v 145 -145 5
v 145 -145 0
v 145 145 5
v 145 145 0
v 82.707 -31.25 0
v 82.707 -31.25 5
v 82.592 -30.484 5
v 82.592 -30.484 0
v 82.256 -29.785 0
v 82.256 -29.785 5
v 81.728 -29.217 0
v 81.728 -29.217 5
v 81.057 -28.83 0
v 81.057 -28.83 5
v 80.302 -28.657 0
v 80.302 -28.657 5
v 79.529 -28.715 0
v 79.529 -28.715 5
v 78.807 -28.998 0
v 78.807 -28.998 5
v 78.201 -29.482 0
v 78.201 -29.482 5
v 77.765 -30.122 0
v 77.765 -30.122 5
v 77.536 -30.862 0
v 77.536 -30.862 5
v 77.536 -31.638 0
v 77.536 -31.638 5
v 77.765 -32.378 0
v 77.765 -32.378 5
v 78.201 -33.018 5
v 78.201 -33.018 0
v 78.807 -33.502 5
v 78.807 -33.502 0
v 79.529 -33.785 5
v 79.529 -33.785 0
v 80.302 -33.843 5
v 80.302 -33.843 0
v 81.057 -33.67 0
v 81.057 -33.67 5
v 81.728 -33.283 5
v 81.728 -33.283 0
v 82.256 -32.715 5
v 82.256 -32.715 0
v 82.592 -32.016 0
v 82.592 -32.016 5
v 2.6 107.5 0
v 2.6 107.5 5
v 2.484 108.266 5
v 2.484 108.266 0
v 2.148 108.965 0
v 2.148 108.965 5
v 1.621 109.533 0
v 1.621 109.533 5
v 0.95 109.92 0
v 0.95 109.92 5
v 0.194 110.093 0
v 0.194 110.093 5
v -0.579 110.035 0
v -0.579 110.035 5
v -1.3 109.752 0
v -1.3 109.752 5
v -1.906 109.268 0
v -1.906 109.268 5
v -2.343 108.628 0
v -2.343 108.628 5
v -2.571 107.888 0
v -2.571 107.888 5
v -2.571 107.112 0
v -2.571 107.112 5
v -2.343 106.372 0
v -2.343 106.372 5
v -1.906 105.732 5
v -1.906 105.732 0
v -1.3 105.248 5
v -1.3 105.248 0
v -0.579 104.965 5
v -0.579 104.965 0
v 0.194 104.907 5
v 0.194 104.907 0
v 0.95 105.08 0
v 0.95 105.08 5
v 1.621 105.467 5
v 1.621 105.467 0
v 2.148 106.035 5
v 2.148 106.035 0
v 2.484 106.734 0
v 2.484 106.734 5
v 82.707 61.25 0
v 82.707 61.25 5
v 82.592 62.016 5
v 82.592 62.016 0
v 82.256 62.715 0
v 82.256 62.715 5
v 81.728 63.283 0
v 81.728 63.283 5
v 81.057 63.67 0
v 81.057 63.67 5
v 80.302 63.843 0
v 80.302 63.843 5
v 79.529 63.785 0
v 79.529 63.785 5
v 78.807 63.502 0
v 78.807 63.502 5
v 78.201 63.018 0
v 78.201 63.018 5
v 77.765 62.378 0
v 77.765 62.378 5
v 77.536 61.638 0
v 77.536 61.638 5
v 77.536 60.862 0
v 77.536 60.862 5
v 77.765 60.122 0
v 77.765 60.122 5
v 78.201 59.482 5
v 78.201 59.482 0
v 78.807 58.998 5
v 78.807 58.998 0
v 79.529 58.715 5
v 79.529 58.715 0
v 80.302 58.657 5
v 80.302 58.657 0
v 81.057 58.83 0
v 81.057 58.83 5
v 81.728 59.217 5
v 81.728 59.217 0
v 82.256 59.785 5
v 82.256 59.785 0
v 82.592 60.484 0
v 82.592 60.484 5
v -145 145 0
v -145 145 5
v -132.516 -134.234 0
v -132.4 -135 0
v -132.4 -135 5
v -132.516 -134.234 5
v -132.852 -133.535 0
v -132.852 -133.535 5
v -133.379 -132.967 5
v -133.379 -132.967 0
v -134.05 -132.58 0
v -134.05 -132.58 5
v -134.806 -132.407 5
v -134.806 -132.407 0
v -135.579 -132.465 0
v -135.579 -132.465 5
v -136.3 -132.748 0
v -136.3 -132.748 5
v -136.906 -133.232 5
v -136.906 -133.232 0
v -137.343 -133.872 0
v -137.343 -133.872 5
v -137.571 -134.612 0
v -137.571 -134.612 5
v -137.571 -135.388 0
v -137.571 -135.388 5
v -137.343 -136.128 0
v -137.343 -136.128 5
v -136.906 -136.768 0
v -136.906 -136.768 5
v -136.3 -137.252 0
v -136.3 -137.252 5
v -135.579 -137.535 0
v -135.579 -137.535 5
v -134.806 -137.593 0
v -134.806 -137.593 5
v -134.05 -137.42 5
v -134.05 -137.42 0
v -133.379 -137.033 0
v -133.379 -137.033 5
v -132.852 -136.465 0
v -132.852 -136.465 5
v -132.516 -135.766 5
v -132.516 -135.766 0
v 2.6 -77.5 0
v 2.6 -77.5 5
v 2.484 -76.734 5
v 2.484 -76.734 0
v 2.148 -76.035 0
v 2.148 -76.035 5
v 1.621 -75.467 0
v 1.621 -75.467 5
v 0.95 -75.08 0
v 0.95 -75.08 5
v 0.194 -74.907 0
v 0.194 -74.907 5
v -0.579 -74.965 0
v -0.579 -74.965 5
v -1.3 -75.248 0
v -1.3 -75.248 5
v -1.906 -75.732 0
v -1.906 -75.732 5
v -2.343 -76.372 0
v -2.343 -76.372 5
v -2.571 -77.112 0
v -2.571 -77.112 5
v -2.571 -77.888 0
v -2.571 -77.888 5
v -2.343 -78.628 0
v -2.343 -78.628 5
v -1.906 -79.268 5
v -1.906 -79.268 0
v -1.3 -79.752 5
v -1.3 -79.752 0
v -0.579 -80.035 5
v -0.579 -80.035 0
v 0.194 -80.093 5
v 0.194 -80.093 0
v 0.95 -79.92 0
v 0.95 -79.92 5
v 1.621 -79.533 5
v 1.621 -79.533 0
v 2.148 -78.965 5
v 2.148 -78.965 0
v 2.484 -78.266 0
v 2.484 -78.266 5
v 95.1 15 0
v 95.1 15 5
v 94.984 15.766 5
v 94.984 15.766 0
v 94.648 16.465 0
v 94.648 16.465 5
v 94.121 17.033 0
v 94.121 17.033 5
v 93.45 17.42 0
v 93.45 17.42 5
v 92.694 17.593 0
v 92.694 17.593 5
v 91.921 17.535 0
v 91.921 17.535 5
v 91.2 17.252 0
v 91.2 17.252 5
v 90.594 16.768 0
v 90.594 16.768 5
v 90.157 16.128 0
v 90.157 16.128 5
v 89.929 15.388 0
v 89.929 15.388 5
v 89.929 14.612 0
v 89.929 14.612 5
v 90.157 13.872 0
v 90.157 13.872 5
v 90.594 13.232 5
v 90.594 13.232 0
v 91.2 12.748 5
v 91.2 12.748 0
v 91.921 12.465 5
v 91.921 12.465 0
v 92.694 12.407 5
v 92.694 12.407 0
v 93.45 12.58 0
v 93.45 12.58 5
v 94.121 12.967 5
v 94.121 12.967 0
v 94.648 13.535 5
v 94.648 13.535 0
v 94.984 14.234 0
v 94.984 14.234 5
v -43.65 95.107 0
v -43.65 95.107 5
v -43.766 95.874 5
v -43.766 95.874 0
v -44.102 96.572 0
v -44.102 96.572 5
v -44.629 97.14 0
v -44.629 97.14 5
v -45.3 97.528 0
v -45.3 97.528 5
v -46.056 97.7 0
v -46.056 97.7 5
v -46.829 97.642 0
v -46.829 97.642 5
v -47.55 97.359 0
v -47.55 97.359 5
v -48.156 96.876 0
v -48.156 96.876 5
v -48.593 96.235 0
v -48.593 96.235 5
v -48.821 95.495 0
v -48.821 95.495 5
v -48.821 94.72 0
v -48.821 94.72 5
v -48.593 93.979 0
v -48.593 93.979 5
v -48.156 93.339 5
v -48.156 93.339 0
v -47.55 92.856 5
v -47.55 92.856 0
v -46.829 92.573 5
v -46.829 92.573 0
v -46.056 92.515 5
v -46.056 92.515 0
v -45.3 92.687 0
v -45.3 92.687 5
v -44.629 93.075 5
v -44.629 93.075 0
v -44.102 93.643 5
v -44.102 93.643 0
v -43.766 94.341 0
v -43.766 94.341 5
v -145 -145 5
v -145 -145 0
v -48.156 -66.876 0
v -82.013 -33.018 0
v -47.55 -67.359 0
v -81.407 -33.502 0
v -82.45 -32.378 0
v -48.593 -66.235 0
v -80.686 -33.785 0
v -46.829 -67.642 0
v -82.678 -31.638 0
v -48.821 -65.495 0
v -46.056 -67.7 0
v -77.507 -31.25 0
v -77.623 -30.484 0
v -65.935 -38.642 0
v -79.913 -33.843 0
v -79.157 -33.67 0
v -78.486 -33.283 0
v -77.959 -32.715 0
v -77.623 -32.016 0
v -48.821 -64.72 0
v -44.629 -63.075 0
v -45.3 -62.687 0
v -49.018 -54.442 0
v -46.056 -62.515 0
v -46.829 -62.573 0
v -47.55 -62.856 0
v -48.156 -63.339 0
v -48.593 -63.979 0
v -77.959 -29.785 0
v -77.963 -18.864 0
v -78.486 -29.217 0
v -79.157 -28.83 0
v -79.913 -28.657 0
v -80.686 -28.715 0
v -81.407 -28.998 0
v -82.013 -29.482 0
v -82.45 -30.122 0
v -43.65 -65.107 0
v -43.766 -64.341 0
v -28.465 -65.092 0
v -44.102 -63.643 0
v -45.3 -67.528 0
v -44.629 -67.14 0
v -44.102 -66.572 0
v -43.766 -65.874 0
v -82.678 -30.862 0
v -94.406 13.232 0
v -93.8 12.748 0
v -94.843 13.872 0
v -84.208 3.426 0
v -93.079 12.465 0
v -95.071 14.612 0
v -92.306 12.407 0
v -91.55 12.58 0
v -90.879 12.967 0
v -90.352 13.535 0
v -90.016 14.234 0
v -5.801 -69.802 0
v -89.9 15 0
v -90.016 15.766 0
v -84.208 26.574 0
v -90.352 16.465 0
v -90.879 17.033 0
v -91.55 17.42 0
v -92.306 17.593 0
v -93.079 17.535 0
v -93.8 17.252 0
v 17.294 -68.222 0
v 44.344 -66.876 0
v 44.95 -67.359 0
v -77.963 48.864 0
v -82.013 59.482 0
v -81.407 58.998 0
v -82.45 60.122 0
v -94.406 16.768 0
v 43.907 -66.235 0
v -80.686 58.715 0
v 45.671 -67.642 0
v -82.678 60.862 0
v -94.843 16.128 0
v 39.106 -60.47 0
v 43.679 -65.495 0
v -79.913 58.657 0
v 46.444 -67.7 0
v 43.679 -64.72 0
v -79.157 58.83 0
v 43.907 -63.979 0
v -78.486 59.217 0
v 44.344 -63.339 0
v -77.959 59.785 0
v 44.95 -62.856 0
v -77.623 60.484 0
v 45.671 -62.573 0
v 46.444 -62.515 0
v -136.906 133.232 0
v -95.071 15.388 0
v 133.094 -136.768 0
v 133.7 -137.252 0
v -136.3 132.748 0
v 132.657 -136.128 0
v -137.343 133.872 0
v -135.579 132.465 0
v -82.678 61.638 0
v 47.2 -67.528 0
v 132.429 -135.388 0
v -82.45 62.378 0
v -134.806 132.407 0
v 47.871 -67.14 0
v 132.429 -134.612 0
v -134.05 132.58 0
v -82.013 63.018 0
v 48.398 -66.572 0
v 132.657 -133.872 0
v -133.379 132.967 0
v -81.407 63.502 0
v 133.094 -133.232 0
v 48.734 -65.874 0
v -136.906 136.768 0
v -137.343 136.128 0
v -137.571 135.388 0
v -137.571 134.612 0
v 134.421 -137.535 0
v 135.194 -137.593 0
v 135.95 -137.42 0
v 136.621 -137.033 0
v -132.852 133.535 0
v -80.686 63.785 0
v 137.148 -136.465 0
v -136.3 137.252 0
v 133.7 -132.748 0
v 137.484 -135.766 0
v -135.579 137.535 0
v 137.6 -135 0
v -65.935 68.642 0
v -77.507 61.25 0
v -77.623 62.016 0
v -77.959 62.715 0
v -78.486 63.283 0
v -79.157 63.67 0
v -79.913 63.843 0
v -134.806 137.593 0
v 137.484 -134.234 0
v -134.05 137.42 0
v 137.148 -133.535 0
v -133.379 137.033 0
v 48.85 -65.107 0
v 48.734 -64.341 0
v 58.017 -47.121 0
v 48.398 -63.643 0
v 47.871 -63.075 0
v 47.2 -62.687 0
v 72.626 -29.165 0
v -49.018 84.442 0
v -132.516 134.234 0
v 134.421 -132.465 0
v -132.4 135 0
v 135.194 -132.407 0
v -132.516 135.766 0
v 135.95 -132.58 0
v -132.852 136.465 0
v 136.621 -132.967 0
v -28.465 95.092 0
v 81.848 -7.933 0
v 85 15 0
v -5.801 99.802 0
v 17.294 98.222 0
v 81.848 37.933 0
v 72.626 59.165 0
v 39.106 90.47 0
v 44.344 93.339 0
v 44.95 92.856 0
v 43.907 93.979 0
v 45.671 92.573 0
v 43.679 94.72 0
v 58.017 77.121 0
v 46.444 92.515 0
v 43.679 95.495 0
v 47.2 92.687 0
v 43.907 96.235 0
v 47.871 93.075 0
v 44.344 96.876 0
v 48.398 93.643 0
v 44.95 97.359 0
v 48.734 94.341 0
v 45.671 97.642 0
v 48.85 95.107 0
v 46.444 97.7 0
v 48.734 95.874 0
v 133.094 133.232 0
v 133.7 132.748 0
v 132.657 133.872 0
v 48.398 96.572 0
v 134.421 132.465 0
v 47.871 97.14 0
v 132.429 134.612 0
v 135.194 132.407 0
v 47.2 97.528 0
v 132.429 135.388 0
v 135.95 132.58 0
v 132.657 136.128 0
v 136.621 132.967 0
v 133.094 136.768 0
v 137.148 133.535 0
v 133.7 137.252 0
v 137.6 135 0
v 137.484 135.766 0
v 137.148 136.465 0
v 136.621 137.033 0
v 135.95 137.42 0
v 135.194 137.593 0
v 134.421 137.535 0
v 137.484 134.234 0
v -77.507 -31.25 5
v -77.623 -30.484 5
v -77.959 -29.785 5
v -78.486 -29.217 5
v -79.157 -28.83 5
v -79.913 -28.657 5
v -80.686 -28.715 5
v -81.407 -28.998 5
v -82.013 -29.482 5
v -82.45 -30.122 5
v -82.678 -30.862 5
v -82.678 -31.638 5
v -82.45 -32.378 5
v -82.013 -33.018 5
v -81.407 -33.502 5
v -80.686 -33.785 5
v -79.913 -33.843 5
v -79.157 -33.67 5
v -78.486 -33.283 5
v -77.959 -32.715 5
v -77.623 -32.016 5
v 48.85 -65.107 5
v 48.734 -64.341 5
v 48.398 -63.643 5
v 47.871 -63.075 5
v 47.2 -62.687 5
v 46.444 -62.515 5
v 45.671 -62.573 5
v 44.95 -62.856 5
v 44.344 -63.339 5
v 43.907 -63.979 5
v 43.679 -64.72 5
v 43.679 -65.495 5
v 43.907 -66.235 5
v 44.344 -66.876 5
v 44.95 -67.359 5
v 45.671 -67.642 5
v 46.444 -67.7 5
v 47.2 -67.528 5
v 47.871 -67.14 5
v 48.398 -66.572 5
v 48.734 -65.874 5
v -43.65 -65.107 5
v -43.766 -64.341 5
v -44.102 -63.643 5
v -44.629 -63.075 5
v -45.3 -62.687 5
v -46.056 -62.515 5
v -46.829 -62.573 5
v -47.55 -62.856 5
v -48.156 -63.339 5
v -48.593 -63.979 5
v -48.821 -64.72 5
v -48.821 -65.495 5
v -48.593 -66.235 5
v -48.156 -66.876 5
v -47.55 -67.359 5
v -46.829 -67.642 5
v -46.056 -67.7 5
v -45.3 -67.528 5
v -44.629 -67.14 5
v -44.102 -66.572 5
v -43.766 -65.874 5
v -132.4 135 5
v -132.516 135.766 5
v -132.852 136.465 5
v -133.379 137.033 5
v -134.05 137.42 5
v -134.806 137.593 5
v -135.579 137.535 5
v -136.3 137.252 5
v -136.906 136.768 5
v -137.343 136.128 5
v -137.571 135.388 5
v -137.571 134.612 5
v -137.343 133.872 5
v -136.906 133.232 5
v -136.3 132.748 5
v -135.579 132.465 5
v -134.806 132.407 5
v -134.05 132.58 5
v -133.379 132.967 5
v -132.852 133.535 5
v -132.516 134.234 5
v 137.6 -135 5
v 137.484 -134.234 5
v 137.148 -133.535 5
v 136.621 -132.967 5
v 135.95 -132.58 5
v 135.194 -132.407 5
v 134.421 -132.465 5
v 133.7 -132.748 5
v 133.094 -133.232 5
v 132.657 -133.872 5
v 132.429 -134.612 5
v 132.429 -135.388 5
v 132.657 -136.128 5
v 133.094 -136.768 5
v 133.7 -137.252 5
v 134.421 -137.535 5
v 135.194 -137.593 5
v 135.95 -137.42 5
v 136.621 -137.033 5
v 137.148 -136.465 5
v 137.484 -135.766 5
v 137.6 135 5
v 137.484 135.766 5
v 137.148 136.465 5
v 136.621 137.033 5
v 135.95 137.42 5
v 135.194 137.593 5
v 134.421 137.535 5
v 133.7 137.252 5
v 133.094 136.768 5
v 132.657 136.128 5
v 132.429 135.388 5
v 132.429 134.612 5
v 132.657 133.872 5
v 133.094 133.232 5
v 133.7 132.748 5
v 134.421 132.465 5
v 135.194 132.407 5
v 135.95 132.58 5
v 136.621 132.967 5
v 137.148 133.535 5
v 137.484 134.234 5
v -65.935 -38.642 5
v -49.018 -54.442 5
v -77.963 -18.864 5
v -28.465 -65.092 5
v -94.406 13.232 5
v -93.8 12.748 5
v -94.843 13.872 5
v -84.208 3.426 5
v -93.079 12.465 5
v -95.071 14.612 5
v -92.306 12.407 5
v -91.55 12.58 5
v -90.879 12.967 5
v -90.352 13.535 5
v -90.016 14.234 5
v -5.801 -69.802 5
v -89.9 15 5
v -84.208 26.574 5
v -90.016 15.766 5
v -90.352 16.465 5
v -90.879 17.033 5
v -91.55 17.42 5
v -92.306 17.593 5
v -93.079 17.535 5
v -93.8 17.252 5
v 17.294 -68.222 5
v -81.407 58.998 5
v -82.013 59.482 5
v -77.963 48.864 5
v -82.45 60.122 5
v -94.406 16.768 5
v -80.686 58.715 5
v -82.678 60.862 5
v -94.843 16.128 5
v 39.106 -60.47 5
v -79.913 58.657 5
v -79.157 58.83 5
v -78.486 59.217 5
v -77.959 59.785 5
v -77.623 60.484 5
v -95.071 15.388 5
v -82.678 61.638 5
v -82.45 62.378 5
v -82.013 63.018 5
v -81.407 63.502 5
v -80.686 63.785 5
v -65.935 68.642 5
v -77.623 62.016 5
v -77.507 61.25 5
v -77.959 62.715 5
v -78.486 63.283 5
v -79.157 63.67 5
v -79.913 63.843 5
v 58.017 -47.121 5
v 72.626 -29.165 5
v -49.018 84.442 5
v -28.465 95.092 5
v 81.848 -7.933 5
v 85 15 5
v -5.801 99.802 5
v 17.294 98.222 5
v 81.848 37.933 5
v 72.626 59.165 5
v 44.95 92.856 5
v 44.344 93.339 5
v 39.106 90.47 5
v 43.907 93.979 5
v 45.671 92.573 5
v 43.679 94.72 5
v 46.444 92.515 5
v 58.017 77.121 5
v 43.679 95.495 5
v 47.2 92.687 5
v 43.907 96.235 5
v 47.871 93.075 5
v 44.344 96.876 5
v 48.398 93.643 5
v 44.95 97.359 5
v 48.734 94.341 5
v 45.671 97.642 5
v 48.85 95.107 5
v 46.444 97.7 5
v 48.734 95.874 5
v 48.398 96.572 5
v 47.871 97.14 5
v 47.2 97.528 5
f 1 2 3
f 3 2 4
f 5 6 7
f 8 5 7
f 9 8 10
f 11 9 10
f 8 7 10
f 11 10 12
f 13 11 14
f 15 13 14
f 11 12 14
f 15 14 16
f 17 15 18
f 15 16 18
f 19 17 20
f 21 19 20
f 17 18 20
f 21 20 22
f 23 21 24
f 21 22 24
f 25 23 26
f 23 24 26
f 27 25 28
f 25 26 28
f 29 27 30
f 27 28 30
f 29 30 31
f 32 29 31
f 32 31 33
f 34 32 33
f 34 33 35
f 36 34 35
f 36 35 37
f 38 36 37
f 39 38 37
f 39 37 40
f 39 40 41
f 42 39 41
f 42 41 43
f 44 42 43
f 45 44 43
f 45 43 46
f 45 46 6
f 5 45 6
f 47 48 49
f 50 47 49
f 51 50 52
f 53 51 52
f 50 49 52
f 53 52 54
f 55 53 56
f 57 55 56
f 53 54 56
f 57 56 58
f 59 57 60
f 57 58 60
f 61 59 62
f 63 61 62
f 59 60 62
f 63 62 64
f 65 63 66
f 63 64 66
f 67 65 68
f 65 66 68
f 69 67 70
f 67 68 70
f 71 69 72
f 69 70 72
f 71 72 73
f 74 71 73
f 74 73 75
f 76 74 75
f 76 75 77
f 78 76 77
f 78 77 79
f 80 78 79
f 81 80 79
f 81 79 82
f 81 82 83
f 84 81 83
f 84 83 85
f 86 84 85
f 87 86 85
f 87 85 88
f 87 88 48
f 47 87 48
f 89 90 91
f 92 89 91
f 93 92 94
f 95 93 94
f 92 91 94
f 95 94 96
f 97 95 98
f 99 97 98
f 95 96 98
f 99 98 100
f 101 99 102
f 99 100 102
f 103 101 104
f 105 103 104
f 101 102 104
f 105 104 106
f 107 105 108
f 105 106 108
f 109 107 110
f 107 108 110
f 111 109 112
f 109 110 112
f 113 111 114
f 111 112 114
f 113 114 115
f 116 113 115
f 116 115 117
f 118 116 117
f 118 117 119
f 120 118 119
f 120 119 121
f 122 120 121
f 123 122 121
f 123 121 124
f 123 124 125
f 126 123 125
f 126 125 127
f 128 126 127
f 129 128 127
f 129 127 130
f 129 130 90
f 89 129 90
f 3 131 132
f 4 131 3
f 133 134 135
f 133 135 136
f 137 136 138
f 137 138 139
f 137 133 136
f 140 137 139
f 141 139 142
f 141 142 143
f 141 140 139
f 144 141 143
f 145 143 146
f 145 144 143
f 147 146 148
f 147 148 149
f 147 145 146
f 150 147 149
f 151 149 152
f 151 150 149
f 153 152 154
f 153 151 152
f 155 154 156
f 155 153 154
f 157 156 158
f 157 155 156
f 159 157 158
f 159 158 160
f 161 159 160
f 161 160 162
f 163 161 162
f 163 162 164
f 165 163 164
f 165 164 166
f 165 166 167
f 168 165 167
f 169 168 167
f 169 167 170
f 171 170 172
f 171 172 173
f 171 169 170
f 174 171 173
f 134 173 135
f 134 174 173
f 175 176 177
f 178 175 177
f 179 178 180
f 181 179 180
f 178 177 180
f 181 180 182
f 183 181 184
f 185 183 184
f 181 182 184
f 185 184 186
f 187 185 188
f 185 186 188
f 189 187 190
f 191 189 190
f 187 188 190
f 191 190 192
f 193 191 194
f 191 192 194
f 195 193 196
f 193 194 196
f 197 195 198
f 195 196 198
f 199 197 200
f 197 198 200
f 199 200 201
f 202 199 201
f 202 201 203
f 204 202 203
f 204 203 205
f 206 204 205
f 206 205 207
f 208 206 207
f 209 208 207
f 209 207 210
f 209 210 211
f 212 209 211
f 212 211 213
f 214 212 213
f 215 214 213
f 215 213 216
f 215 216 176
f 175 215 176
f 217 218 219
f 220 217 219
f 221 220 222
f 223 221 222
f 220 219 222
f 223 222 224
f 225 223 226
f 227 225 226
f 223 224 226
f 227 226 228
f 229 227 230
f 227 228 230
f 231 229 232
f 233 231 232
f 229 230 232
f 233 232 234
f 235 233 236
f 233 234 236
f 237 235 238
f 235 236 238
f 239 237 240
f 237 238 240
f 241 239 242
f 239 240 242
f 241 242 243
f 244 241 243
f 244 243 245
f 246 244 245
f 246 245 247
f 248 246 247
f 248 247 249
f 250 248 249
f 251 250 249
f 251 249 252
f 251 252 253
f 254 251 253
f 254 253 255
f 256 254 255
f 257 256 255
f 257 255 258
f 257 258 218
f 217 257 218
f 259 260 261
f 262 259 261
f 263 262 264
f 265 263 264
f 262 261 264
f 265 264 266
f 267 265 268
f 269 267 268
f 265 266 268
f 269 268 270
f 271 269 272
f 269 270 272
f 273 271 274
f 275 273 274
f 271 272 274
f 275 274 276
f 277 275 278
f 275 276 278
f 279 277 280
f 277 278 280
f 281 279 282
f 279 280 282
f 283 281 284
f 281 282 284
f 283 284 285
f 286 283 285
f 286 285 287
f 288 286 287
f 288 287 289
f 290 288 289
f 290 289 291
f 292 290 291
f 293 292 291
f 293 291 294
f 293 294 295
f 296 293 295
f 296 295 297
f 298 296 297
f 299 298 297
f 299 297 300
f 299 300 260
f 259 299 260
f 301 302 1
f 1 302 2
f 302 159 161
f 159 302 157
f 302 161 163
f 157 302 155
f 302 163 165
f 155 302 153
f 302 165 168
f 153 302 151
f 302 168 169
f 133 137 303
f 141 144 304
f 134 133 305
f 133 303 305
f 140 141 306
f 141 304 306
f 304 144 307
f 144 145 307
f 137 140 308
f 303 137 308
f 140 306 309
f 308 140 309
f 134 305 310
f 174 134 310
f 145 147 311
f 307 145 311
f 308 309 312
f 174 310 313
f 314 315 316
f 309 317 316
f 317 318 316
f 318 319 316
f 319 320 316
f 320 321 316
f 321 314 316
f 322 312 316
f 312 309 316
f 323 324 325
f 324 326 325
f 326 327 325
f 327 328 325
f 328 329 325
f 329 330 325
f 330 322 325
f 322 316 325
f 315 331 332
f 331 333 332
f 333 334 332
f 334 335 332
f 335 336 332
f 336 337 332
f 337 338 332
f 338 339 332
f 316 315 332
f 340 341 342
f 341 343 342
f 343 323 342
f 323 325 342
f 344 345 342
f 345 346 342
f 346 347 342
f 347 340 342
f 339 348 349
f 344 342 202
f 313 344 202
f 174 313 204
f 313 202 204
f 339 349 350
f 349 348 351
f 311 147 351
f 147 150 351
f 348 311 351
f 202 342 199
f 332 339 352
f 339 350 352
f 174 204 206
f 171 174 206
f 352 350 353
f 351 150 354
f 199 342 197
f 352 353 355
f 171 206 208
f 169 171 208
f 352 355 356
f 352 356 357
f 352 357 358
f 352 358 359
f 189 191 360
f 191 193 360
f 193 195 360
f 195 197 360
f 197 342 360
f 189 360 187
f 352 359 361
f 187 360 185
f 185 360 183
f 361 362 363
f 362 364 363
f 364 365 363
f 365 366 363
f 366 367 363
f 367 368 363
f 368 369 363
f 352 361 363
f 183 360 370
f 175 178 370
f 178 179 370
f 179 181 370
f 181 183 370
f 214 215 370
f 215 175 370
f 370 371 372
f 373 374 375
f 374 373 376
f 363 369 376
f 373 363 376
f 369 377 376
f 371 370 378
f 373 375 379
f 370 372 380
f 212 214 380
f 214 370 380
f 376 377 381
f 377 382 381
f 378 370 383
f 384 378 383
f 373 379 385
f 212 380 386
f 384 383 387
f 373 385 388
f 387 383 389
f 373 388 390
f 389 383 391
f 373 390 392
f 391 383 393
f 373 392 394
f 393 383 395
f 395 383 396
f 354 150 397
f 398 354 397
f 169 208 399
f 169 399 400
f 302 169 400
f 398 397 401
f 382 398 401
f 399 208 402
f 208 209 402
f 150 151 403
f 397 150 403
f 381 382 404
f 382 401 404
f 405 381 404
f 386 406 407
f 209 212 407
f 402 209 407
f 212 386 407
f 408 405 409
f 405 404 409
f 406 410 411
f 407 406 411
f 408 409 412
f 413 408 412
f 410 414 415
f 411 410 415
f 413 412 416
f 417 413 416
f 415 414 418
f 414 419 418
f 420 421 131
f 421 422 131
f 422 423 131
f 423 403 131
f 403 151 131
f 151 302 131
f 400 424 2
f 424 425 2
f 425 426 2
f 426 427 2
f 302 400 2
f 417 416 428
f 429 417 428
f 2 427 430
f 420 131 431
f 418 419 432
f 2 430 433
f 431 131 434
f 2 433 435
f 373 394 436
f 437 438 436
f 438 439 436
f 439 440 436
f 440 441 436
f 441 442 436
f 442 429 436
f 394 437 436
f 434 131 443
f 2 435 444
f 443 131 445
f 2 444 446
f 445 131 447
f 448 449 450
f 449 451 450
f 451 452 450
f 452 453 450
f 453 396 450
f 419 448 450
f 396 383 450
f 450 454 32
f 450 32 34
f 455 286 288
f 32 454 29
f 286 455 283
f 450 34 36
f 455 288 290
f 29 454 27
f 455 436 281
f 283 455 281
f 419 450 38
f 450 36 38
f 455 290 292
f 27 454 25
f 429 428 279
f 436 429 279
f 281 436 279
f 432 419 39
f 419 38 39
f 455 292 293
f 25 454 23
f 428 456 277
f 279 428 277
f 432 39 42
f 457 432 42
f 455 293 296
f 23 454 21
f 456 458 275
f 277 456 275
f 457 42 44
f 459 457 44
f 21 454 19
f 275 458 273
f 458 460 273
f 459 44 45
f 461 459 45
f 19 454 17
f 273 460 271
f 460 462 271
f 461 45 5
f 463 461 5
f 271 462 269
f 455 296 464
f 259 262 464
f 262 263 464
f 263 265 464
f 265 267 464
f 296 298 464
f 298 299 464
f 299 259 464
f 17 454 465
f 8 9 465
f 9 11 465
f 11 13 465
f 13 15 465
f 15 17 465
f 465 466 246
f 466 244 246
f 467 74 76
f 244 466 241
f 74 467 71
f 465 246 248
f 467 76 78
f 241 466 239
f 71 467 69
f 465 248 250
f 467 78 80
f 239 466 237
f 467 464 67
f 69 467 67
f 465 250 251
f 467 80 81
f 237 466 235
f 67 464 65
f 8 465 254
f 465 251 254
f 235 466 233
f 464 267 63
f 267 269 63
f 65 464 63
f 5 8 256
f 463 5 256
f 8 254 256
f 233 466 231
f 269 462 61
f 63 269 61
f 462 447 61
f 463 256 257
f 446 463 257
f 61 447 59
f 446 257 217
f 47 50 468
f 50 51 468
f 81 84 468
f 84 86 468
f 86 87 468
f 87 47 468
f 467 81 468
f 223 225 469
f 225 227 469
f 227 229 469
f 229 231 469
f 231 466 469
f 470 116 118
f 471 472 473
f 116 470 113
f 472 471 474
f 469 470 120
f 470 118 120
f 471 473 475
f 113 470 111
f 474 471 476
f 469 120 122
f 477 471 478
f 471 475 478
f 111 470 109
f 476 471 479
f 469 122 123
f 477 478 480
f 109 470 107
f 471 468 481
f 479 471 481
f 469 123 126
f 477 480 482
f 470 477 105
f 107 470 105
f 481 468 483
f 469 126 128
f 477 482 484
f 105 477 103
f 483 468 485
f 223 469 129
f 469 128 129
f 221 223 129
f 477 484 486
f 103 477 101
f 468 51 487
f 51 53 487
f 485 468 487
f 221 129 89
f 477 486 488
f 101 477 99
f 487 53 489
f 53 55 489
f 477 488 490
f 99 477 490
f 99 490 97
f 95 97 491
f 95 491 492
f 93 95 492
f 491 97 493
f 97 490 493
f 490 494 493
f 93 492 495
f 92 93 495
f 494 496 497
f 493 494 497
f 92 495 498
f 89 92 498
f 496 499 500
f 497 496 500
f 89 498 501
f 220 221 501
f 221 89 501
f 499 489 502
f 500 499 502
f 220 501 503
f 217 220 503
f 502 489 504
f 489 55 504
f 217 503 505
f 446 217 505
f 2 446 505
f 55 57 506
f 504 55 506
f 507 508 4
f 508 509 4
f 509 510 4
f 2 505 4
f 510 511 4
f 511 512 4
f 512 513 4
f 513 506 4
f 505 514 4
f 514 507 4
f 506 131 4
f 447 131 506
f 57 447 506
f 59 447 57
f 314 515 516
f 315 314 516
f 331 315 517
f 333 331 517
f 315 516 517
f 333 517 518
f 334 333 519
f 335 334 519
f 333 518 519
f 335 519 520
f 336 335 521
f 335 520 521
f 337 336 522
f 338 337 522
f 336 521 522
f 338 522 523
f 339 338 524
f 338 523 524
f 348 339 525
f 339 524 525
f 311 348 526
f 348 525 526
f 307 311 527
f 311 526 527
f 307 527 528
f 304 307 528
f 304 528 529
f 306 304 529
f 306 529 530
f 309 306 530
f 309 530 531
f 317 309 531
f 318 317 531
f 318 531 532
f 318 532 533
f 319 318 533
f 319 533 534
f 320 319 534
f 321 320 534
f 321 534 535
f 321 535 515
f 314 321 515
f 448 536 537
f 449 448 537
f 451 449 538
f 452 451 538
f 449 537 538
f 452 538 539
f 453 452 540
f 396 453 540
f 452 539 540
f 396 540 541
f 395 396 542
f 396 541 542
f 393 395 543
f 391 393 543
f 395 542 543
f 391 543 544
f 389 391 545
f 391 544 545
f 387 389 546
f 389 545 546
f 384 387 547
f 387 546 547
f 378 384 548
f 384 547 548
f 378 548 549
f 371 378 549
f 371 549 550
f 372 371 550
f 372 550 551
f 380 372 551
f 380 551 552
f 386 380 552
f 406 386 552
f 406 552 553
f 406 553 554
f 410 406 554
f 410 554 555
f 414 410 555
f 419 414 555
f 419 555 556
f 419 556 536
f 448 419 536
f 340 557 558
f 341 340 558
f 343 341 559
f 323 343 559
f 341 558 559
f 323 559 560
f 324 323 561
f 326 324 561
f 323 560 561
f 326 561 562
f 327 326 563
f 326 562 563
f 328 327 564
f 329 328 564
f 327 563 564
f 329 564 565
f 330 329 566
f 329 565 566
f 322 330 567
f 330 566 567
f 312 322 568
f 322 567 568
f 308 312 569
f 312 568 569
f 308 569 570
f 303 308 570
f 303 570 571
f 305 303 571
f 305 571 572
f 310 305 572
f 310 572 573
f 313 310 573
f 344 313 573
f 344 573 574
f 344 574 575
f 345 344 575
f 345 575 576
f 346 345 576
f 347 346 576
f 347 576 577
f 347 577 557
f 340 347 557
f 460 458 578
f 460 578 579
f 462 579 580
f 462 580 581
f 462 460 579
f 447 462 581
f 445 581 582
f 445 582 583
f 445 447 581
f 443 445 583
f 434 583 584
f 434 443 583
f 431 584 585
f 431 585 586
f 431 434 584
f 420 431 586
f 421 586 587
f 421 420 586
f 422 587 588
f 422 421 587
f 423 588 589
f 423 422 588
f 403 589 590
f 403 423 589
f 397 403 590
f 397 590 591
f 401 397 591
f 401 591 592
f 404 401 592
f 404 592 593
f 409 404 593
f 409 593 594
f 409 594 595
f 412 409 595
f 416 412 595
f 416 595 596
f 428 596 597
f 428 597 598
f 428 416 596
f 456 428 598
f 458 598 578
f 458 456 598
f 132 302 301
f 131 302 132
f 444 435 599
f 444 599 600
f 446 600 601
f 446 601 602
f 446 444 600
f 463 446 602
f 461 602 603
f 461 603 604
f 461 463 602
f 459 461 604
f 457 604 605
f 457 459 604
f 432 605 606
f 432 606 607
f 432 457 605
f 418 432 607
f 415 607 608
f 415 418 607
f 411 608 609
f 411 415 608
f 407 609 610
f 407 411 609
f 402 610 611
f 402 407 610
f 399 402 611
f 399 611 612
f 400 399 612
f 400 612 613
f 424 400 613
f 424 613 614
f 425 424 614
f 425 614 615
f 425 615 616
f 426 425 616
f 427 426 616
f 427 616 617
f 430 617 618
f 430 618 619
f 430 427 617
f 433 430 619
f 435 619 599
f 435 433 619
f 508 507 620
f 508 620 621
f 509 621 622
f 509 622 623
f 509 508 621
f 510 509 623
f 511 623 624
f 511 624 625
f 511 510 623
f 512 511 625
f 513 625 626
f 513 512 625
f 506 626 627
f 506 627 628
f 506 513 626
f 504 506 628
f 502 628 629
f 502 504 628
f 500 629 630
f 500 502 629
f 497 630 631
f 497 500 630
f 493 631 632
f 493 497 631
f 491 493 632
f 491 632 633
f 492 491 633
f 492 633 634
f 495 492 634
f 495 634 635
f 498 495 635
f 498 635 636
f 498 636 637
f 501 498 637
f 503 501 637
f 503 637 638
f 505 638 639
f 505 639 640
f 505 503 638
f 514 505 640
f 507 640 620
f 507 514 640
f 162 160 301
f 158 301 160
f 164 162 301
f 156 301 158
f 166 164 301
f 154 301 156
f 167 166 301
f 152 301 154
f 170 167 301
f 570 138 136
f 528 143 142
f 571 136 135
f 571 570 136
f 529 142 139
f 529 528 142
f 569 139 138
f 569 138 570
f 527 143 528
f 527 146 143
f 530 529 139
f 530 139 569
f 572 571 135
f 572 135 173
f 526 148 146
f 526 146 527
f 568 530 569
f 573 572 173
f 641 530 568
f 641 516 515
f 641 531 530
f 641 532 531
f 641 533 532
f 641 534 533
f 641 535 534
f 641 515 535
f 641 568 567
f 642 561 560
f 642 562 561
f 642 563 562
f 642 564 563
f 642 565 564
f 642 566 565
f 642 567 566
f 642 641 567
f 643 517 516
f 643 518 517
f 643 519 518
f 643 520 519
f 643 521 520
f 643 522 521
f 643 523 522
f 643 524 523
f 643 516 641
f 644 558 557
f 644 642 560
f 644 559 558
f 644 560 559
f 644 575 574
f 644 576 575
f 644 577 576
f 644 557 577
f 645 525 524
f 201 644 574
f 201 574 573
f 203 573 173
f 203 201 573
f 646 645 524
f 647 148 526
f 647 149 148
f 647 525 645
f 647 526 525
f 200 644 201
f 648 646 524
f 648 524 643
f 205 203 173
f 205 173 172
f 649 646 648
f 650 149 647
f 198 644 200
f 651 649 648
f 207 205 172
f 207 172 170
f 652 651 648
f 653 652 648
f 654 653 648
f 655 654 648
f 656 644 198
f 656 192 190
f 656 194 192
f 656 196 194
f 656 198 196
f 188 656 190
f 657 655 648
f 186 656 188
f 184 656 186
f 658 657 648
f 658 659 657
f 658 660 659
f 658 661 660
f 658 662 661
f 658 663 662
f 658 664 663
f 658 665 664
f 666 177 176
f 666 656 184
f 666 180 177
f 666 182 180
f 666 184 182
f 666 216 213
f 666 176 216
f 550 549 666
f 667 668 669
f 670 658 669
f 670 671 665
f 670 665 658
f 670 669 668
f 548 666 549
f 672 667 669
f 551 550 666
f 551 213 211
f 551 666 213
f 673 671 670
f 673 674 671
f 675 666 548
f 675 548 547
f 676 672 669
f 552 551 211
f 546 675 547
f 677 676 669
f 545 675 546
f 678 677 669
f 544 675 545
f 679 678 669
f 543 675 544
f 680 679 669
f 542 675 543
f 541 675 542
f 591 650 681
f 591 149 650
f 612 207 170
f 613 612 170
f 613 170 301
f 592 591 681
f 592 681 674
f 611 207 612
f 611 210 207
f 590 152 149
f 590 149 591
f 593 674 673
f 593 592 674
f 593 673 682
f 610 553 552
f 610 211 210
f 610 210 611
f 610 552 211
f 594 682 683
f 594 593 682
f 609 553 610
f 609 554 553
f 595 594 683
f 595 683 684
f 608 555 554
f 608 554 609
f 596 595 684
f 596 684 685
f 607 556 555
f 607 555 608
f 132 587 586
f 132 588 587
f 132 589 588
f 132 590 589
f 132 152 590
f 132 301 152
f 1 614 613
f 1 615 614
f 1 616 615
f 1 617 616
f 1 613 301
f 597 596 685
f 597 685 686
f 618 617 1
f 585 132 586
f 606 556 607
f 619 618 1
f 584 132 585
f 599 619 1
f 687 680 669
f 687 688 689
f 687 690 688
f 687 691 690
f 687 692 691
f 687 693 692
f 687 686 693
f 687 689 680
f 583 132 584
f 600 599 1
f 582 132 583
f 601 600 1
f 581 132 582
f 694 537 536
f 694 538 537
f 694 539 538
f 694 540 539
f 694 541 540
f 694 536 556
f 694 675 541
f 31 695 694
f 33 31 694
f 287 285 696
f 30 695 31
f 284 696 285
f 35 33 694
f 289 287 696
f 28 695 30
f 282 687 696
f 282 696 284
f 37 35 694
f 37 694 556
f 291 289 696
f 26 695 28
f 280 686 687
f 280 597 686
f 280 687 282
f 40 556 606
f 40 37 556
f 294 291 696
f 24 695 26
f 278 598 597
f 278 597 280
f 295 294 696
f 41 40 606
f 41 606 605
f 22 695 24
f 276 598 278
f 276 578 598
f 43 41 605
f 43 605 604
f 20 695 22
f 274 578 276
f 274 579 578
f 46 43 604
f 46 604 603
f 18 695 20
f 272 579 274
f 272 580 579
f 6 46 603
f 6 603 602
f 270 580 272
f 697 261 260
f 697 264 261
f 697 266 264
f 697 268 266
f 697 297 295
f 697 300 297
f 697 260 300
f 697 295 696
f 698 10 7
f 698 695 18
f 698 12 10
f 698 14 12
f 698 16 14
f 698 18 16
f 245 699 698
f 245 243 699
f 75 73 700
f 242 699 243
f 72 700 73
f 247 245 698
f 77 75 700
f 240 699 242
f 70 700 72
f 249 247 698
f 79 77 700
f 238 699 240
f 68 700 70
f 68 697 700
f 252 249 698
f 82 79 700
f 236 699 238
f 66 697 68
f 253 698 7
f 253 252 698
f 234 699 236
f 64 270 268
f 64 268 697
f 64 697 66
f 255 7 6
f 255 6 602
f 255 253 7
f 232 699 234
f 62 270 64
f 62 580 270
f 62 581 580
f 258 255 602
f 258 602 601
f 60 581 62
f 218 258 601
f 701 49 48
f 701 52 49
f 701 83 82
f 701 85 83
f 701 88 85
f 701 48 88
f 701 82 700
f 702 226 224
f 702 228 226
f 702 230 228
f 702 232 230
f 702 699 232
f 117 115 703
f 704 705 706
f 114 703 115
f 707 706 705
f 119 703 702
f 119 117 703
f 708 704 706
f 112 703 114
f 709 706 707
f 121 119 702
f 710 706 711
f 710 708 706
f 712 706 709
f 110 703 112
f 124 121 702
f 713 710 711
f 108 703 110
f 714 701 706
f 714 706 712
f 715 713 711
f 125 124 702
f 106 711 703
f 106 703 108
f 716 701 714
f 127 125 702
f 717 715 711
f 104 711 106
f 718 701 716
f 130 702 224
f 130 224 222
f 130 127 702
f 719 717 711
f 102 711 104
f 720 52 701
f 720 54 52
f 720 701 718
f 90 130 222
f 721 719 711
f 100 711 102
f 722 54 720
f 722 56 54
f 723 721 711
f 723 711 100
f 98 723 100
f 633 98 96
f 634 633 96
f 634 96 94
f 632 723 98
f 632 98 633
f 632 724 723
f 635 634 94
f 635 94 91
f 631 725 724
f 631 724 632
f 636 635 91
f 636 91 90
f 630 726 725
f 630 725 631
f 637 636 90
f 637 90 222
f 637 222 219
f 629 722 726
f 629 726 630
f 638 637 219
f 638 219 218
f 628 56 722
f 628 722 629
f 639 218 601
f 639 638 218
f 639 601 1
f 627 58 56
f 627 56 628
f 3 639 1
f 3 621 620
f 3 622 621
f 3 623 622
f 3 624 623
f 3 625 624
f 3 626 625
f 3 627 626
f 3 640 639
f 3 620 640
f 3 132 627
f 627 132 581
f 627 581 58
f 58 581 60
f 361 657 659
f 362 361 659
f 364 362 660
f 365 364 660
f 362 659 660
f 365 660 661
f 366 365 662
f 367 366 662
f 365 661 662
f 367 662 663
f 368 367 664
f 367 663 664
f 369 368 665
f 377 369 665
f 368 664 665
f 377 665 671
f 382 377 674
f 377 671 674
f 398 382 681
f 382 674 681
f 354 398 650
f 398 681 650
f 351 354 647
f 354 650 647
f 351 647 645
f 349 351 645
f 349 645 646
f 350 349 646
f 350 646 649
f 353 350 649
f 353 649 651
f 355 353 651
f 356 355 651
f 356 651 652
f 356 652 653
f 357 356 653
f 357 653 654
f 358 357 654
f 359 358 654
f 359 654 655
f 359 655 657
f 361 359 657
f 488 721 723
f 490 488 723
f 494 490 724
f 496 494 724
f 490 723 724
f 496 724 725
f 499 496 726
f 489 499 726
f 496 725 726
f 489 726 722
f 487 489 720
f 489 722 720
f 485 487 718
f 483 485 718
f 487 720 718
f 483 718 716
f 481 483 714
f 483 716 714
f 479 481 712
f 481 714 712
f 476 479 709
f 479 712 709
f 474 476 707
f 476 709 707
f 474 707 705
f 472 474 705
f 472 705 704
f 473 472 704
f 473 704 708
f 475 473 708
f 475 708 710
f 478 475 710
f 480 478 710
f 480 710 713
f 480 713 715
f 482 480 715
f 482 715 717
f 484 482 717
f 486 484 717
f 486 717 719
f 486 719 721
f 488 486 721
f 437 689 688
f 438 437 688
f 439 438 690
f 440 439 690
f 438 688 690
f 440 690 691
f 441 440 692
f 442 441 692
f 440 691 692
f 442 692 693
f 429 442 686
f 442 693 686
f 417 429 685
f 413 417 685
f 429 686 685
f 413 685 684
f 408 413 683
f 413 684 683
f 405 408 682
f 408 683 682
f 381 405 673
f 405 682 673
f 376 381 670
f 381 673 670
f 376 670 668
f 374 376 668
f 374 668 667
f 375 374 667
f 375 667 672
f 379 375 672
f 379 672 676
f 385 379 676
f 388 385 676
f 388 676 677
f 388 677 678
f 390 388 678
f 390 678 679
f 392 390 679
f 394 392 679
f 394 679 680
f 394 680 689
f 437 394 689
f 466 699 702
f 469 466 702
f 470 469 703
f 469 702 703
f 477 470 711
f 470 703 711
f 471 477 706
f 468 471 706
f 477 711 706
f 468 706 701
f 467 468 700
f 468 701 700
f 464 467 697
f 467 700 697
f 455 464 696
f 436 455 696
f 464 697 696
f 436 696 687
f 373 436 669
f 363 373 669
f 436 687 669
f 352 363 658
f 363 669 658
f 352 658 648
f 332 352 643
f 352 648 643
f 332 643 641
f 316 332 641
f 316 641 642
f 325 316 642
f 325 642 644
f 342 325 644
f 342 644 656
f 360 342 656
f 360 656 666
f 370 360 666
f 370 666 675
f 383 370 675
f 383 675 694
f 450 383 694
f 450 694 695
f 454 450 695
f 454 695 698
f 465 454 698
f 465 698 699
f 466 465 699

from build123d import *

# Parameters (mm, degrees)
F0_W     = 290
F0_H     = 290
F0_R     = 2.6
F1_DEPTH = 5
F2_R     = 85
F3_DEPTH = 5.001
F4_R     = 2.6
F5_DEPTH = 5.001


with BuildPart() as f1:
    # F0 (on Top) → F1 (new body)
    with BuildSketch(Plane.XY):
        Rectangle(F0_W, F0_H)
        with Locations((-135, -135)):
            Circle(F0_R, mode=Mode.SUBTRACT)
        with Locations((135, -135)):
            Circle(F0_R, mode=Mode.SUBTRACT)
        with Locations((-135, 135)):
            Circle(F0_R, mode=Mode.SUBTRACT)
        with Locations((135, 135)):
            Circle(F0_R, mode=Mode.SUBTRACT)
    extrude(amount=F1_DEPTH)

    # F2 (on face) → F3 (cut, through all)
    with BuildSketch(Plane.XY.offset(5)):
        with Locations((0, 15)):
            Circle(F2_R)
    extrude(amount=-F3_DEPTH, mode=Mode.SUBTRACT)

    # F4 (on face) → F5 (cut, through all)
    with BuildSketch(Plane.XY.offset(5)):
        with Locations((0, 107.5)):
            Circle(F4_R)
        with Locations((-46.25, 95.10735)):
            Circle(F4_R)
        with Locations((-80.10735, 61.25)):
            Circle(F4_R)
        with Locations((-92.5, 15)):
            Circle(F4_R)
        with Locations((-80.10735, -31.25)):
            Circle(F4_R)
        with Locations((-46.25, -65.10735)):
            Circle(F4_R)
        with Locations((0, -77.5)):
            Circle(F4_R)
        with Locations((46.25, -65.10735)):
            Circle(F4_R)
        with Locations((80.10735, -31.25)):
            Circle(F4_R)
        with Locations((92.5, 15)):
            Circle(F4_R)
        with Locations((80.10735, 61.25)):
            Circle(F4_R)
        with Locations((46.25, 95.10735)):
            Circle(F4_R)
    extrude(amount=-F5_DEPTH, mode=Mode.SUBTRACT)


solid = f1.part
